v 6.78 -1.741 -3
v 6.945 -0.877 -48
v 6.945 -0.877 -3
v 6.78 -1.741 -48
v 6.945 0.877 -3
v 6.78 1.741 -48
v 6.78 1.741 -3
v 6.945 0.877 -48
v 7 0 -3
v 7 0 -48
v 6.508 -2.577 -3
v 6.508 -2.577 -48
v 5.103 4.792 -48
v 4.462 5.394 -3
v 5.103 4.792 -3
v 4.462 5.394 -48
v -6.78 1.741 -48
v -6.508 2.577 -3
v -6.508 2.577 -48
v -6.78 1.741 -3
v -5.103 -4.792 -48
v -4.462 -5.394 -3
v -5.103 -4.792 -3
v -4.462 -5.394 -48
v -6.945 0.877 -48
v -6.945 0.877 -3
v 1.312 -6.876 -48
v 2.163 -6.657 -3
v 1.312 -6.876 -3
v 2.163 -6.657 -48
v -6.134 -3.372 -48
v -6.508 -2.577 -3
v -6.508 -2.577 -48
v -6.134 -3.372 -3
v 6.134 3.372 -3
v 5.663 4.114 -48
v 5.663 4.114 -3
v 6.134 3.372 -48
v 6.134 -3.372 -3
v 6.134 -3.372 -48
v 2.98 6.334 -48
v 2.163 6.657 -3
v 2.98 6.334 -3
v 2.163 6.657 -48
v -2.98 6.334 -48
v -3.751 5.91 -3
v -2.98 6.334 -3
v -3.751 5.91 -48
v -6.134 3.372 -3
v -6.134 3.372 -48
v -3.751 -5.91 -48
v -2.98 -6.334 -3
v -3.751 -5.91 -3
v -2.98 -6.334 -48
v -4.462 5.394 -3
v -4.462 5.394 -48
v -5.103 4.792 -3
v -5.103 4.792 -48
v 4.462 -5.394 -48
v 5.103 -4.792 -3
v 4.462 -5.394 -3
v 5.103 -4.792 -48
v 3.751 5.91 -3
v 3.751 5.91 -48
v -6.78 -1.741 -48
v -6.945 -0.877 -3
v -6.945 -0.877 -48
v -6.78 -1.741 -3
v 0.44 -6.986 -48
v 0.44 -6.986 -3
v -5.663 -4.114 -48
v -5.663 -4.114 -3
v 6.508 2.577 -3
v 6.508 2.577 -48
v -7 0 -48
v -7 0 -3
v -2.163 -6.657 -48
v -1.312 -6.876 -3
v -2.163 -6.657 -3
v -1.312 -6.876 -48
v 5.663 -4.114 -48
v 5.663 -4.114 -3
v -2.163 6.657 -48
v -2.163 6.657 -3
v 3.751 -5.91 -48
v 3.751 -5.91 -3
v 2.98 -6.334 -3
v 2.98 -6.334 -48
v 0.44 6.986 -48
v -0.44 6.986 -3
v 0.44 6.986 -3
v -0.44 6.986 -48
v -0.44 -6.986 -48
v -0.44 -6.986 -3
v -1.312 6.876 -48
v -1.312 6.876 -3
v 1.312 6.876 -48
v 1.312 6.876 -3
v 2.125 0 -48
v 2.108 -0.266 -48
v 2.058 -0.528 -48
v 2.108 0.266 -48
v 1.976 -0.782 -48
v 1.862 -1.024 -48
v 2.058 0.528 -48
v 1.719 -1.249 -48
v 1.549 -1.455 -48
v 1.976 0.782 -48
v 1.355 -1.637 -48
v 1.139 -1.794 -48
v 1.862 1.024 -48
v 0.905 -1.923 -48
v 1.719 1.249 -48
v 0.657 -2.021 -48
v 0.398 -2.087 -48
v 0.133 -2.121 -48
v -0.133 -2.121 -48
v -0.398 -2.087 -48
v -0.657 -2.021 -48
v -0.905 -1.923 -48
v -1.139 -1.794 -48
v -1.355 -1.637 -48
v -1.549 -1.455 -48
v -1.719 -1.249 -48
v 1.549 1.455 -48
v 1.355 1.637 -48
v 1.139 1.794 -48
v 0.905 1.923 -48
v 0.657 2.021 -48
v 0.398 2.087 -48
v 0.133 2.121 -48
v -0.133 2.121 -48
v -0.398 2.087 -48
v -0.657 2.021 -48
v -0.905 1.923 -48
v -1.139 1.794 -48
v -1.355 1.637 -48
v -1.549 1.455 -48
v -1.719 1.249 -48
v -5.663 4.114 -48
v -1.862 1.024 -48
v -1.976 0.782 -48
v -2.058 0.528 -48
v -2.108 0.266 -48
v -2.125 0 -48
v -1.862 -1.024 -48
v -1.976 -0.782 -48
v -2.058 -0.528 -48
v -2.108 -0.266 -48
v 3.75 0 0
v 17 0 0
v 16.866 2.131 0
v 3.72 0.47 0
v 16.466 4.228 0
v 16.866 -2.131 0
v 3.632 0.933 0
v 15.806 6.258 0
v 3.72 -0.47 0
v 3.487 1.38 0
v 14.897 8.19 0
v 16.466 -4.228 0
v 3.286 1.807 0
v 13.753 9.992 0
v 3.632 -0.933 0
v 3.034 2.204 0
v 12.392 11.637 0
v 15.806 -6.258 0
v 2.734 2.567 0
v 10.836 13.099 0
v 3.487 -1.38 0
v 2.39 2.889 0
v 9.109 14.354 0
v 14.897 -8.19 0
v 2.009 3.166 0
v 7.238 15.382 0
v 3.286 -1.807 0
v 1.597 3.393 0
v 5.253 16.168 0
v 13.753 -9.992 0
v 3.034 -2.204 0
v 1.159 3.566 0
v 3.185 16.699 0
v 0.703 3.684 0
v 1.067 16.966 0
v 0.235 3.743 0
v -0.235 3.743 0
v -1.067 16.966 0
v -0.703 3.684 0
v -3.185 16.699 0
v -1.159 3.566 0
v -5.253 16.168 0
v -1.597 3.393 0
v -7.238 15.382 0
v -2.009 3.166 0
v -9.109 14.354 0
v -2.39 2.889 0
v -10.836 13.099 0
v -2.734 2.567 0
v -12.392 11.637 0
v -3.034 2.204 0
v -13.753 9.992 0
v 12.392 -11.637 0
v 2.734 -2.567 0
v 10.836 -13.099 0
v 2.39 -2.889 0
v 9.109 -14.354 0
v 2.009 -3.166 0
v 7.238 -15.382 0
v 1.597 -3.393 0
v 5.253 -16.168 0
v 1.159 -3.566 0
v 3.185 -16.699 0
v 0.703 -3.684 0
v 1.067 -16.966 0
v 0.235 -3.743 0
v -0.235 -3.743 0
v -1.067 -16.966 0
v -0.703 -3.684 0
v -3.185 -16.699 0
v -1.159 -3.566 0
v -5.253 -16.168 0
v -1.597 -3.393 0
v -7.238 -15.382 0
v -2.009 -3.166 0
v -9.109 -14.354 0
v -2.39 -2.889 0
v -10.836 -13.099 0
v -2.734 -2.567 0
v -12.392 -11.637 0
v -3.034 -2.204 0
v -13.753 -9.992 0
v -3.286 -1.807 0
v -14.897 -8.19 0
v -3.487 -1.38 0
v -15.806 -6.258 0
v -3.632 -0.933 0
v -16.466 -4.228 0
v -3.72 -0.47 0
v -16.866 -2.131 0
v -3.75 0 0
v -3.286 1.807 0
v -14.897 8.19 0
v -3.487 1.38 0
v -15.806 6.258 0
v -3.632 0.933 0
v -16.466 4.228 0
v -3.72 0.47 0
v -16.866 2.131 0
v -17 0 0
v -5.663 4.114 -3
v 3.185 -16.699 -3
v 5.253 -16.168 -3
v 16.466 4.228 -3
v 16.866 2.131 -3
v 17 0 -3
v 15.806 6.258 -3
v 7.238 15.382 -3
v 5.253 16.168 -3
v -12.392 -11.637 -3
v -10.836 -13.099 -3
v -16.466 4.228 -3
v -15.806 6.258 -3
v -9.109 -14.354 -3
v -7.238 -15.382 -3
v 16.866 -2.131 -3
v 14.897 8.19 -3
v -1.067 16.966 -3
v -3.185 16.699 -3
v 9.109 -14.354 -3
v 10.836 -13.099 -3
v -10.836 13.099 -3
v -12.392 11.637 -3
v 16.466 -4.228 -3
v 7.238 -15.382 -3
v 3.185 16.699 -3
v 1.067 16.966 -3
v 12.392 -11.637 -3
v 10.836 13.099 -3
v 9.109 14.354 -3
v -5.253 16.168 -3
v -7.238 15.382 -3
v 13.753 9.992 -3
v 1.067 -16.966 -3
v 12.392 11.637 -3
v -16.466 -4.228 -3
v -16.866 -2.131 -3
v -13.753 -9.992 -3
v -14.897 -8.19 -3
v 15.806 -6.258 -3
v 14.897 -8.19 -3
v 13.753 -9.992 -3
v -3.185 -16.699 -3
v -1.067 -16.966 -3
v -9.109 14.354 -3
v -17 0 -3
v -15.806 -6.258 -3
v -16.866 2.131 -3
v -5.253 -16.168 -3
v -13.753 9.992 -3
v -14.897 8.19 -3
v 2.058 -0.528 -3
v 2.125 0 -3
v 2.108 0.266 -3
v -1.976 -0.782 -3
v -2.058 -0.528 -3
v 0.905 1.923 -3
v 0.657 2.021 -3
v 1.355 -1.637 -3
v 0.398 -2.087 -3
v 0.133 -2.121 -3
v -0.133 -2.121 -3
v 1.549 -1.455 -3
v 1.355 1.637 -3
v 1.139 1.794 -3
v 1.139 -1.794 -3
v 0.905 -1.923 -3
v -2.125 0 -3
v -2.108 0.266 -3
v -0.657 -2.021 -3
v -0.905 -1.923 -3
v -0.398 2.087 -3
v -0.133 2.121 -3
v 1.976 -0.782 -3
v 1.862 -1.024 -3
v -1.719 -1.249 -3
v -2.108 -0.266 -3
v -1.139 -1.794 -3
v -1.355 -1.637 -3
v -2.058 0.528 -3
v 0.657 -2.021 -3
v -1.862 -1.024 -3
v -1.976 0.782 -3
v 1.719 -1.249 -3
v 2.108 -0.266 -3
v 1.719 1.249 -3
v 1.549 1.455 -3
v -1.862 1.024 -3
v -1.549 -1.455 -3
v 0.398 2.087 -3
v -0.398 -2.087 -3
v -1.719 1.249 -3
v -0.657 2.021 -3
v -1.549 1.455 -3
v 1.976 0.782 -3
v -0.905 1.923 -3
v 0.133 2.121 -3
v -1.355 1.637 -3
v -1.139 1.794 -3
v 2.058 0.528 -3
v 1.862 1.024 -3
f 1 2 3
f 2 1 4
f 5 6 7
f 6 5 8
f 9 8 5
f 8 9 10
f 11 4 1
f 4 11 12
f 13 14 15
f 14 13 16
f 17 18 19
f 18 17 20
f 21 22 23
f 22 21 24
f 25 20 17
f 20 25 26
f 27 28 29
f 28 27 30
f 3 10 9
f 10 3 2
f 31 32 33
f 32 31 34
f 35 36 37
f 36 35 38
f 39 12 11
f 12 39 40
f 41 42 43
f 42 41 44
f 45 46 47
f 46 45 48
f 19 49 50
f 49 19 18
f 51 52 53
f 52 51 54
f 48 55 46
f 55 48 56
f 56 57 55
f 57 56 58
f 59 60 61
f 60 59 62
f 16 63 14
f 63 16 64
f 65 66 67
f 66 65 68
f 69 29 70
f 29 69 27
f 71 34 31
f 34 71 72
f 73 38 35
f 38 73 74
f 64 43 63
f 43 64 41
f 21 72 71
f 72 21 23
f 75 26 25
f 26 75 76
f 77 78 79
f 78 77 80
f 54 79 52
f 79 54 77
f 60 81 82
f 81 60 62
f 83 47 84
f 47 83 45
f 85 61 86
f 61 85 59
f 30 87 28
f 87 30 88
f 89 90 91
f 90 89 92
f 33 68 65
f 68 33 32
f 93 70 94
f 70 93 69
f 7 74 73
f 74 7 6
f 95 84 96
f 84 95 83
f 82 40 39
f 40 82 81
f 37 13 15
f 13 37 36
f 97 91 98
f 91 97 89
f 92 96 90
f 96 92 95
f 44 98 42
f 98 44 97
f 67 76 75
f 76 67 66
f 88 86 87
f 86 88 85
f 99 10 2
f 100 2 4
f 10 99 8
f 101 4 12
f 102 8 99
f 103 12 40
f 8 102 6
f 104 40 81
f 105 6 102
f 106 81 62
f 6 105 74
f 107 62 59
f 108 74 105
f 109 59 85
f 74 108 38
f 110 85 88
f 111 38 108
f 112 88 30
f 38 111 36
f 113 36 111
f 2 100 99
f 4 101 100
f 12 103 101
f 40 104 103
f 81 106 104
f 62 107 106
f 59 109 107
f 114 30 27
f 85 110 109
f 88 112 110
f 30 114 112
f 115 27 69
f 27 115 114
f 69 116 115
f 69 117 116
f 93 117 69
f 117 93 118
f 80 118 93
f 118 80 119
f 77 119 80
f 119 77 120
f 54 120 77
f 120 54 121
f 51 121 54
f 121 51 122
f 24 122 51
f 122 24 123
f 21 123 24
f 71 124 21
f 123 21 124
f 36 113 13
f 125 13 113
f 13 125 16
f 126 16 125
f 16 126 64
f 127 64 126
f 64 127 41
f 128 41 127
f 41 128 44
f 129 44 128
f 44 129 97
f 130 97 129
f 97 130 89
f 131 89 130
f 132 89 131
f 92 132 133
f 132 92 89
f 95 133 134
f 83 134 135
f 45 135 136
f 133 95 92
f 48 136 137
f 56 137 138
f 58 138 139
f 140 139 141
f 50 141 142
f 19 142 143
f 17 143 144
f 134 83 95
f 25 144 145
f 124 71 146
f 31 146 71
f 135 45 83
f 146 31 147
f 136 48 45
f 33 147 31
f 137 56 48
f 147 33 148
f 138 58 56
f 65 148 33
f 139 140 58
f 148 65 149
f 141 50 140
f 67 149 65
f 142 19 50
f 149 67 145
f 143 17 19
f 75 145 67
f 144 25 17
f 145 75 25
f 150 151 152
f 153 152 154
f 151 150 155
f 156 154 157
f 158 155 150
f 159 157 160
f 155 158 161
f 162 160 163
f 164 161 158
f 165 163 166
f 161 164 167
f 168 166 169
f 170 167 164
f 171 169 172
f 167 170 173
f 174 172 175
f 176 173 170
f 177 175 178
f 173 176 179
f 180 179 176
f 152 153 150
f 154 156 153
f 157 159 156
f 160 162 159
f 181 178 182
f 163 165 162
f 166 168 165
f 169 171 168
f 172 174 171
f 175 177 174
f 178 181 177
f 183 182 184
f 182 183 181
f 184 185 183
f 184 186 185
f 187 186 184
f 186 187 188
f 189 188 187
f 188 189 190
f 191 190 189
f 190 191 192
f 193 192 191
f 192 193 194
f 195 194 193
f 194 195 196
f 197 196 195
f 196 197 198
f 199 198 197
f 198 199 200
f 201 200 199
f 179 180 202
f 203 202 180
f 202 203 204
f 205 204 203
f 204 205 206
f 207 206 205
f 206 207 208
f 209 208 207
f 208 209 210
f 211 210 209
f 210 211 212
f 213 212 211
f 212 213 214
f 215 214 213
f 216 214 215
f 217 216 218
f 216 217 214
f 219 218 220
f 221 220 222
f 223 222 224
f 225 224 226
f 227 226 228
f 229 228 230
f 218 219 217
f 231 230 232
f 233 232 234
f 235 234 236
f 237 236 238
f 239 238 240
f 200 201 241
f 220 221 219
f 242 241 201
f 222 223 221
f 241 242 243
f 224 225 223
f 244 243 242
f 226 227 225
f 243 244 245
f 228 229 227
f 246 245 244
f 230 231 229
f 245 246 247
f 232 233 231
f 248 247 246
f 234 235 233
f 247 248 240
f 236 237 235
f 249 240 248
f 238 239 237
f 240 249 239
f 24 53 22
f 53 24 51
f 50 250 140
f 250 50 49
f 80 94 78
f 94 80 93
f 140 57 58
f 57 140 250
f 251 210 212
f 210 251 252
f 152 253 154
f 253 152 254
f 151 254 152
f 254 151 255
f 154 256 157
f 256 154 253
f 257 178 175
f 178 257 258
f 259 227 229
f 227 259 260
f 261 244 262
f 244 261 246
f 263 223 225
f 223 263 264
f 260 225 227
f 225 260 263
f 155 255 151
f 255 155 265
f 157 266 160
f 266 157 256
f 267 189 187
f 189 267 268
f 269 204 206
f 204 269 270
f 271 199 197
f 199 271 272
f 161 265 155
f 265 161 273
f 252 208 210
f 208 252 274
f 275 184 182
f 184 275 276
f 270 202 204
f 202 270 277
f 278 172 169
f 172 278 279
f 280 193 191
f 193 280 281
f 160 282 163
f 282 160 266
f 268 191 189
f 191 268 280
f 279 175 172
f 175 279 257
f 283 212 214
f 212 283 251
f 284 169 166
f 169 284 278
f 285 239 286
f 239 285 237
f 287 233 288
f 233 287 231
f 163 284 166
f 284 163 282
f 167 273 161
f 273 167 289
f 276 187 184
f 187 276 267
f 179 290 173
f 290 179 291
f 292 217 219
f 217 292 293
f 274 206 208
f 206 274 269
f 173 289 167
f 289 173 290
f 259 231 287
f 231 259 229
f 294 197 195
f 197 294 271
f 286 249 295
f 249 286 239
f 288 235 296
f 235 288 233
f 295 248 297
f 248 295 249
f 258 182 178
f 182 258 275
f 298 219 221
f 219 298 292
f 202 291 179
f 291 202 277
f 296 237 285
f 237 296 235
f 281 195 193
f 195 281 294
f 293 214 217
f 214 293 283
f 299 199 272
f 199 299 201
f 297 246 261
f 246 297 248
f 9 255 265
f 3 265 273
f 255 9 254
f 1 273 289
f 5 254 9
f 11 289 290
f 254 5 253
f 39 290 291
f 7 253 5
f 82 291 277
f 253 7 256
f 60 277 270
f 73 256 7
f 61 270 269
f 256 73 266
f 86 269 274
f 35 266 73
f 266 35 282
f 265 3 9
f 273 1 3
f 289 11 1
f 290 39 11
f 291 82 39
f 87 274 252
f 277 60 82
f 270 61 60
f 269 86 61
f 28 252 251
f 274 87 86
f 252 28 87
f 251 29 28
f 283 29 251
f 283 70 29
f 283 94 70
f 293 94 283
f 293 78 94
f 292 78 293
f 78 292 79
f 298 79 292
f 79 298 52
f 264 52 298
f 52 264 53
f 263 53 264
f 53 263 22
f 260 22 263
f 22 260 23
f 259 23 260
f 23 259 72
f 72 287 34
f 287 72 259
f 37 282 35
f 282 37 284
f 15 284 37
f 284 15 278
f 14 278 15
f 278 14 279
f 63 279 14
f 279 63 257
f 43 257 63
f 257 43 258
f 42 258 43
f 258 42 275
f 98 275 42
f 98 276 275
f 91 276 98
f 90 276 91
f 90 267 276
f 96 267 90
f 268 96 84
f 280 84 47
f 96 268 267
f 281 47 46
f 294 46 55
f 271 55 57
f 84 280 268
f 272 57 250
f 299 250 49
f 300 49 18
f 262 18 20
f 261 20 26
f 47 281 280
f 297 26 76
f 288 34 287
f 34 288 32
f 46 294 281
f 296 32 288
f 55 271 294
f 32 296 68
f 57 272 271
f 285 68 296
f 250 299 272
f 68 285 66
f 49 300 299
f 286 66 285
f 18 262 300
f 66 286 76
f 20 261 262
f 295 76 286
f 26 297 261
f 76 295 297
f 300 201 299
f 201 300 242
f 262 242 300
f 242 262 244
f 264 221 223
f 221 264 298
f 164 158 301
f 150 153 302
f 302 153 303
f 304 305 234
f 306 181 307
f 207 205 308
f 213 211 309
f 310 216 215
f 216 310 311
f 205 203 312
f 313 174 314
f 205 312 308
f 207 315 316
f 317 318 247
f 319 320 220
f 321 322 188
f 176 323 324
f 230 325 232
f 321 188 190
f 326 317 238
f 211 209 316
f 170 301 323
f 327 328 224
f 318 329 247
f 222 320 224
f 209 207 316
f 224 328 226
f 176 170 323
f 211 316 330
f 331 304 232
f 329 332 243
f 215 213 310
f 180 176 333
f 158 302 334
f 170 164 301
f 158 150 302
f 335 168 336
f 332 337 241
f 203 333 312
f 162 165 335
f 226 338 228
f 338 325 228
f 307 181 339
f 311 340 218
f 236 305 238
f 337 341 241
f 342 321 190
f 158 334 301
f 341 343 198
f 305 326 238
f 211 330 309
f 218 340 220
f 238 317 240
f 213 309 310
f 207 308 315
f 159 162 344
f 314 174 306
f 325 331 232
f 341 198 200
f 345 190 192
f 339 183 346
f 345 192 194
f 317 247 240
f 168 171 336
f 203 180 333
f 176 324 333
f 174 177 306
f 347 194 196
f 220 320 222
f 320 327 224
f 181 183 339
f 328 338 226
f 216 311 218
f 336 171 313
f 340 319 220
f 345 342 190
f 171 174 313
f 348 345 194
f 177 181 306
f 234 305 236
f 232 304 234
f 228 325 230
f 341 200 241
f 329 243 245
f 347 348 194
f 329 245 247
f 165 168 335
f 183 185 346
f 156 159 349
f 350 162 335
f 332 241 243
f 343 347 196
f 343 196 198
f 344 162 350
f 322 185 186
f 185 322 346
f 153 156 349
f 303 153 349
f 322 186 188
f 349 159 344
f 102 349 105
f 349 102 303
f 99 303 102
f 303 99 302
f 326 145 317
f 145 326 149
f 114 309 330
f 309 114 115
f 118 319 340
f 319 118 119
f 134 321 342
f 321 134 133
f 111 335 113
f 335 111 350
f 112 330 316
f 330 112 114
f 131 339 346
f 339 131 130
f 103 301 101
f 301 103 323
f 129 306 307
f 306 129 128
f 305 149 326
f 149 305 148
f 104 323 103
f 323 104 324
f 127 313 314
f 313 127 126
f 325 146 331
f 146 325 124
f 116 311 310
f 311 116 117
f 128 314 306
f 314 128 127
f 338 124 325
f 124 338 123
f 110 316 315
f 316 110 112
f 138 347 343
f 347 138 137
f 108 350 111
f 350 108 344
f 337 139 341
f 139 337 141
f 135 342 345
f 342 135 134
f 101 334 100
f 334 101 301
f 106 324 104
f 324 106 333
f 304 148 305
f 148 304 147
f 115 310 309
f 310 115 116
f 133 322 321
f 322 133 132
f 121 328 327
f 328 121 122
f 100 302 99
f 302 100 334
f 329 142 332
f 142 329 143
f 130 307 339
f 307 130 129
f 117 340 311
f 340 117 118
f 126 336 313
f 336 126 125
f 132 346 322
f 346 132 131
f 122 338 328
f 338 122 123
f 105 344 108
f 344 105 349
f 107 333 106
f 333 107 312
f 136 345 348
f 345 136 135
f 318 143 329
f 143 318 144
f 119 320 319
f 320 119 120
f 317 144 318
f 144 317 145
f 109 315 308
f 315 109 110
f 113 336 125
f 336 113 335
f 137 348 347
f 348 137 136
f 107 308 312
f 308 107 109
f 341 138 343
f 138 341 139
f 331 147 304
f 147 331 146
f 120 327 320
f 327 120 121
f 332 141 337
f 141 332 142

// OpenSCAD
$fn = 50;


difference() {
	union() {
		translate(v = [0, 0, -48.0000000000]) {
			cylinder(h = 48, r = 7.0000000000);
		}
		translate(v = [0, 0, -3.0000000000]) {
			cylinder(h = 3, r = 17.0000000000);
		}
	}
	union() {
		translate(v = [0, 0, 0]) {
			rotate(a = [0, 0, 0]) {
				difference() {
					union() {
						#translate(v = [0, 0, -48.0000000000]) {
							cylinder(h = 48, r = 2.0000000000);
						}
						#translate(v = [0, 0, -3]) {
							cylinder(h = 3, r1 = 2.1250000000, r2 = 3.7500000000);
						}
						#translate(v = [0, 0, -48.0000000000]) {
							cylinder(h = 48, r = 2.1250000000);
						}
						#translate(v = [0, 0, -48.0000000000]) {
							cylinder(h = 48, r = 2.0000000000);
						}
					}
					union();
				}
			}
		}
	}
}
